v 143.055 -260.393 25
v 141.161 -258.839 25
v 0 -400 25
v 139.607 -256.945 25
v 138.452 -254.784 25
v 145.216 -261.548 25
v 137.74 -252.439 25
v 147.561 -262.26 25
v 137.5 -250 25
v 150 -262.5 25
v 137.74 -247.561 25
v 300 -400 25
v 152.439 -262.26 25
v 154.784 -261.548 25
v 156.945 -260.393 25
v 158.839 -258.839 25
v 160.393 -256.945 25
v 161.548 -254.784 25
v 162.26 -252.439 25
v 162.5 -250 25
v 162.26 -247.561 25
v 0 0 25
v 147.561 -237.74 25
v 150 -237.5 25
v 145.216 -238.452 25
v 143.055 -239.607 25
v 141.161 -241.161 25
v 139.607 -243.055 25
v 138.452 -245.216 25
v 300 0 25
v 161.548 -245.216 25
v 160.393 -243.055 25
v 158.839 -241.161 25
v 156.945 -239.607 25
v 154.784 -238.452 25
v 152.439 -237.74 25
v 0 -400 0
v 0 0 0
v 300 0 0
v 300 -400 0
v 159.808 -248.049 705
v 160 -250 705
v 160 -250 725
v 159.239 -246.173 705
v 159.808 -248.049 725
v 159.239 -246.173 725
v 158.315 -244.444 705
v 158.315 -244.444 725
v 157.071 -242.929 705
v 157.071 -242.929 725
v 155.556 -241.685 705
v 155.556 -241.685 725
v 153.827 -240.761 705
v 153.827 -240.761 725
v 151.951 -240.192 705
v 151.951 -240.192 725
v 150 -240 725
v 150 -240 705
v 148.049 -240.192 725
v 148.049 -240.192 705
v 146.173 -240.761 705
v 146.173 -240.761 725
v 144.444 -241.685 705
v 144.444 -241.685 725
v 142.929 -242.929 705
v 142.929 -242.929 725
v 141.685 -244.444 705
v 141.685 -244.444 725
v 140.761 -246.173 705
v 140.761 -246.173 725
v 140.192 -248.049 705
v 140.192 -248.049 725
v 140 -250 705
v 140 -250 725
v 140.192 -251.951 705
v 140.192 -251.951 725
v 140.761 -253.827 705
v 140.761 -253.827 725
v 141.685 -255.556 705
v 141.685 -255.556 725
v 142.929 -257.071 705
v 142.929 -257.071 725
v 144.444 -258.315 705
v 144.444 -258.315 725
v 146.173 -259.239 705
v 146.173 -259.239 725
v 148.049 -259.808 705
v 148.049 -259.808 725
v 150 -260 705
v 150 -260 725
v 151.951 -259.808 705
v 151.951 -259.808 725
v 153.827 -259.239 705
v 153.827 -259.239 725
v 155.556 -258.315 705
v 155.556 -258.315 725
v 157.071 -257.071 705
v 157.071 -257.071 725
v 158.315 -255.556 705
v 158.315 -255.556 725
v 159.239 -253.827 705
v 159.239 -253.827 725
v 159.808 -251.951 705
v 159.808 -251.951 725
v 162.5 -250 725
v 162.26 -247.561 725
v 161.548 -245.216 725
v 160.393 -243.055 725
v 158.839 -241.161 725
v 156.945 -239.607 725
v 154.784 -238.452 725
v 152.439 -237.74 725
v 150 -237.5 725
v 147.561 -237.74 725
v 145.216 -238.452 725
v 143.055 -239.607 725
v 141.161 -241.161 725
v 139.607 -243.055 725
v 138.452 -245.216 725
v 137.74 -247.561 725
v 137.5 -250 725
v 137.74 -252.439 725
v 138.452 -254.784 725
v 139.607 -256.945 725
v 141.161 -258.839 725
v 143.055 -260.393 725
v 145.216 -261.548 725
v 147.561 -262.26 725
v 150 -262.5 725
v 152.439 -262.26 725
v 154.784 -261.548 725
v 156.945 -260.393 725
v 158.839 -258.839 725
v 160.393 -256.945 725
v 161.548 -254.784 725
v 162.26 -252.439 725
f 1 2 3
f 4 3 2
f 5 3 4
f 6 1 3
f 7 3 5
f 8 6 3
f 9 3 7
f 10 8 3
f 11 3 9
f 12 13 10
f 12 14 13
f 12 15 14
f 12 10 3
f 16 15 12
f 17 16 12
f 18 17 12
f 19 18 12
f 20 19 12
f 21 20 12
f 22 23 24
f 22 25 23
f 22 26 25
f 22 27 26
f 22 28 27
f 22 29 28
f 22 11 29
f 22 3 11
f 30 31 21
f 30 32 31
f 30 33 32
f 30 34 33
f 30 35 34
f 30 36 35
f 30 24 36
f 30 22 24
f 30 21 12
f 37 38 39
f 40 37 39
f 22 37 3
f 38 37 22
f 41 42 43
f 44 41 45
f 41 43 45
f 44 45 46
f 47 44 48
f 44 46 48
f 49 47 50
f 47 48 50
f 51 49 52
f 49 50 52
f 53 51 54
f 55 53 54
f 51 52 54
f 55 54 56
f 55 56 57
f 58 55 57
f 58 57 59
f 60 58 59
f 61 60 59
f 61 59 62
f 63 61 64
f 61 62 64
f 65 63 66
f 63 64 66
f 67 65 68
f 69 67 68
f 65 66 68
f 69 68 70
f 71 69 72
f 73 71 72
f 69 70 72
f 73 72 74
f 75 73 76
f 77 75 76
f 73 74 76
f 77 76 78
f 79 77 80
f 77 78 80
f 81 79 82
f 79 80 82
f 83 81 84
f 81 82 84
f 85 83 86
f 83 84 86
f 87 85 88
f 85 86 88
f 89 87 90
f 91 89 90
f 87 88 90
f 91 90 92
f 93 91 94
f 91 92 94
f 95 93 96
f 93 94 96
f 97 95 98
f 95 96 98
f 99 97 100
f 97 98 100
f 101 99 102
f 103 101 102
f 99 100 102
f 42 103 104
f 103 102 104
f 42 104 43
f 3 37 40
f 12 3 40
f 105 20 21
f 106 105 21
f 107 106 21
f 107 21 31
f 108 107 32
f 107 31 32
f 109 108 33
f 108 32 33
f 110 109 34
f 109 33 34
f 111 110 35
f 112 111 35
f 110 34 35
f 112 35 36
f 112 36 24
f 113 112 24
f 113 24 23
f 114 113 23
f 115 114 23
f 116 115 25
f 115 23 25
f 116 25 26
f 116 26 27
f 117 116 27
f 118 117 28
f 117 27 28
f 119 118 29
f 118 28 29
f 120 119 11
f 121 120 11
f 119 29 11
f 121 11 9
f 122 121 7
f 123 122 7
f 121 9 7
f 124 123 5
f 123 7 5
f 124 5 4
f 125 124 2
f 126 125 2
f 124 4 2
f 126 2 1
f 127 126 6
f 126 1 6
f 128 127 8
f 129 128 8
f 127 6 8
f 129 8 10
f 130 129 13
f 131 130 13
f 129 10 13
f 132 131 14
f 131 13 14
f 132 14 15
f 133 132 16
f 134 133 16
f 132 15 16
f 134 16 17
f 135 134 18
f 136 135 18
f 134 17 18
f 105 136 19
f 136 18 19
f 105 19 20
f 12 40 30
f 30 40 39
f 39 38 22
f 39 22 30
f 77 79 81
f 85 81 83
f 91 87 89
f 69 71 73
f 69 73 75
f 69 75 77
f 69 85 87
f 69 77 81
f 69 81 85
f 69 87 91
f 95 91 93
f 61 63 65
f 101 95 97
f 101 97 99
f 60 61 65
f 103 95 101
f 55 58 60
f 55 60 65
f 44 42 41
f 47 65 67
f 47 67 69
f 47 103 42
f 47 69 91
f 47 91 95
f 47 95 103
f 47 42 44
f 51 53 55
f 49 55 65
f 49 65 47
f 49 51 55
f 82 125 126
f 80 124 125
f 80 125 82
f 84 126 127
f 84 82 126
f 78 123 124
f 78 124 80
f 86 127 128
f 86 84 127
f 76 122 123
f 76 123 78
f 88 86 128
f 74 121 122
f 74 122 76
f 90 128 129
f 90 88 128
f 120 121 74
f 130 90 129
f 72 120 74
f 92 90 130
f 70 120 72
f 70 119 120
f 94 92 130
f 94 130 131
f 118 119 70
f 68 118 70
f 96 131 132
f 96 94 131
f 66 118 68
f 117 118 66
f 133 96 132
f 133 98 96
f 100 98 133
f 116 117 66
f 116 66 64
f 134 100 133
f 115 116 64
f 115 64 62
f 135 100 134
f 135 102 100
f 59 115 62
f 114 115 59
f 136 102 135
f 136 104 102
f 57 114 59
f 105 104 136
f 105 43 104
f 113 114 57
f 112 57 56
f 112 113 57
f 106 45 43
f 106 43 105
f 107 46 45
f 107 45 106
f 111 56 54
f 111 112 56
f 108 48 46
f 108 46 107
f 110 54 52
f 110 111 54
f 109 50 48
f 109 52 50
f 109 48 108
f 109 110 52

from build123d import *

# Parameters (mm, degrees)
F0_W     = 300
F0_H     = 400
F1_DEPTH = 25
F2_R     = 12.5
F3_DEPTH = 700
F4_R     = 10
F5_DEPTH = 20


with BuildPart() as f1:
    # F0 (on Top) → F1 (new body)
    with BuildSketch(Plane.XY):
        with Locations((150, -200)):
            Rectangle(F0_W, F0_H)
    extrude(amount=F1_DEPTH)

    # F2 (on face) → F3 (join)
    with BuildSketch(Plane.XY.offset(25)):
        with Locations((150, -250)):
            Circle(F2_R)
    extrude(amount=F3_DEPTH)

    # F4 (on face) → F5 (cut)
    with BuildSketch(Plane.XY.offset(725)):
        with Locations((150, -250)):
            Circle(F4_R)
    extrude(amount=-F5_DEPTH, mode=Mode.SUBTRACT)


solid = f1.part
